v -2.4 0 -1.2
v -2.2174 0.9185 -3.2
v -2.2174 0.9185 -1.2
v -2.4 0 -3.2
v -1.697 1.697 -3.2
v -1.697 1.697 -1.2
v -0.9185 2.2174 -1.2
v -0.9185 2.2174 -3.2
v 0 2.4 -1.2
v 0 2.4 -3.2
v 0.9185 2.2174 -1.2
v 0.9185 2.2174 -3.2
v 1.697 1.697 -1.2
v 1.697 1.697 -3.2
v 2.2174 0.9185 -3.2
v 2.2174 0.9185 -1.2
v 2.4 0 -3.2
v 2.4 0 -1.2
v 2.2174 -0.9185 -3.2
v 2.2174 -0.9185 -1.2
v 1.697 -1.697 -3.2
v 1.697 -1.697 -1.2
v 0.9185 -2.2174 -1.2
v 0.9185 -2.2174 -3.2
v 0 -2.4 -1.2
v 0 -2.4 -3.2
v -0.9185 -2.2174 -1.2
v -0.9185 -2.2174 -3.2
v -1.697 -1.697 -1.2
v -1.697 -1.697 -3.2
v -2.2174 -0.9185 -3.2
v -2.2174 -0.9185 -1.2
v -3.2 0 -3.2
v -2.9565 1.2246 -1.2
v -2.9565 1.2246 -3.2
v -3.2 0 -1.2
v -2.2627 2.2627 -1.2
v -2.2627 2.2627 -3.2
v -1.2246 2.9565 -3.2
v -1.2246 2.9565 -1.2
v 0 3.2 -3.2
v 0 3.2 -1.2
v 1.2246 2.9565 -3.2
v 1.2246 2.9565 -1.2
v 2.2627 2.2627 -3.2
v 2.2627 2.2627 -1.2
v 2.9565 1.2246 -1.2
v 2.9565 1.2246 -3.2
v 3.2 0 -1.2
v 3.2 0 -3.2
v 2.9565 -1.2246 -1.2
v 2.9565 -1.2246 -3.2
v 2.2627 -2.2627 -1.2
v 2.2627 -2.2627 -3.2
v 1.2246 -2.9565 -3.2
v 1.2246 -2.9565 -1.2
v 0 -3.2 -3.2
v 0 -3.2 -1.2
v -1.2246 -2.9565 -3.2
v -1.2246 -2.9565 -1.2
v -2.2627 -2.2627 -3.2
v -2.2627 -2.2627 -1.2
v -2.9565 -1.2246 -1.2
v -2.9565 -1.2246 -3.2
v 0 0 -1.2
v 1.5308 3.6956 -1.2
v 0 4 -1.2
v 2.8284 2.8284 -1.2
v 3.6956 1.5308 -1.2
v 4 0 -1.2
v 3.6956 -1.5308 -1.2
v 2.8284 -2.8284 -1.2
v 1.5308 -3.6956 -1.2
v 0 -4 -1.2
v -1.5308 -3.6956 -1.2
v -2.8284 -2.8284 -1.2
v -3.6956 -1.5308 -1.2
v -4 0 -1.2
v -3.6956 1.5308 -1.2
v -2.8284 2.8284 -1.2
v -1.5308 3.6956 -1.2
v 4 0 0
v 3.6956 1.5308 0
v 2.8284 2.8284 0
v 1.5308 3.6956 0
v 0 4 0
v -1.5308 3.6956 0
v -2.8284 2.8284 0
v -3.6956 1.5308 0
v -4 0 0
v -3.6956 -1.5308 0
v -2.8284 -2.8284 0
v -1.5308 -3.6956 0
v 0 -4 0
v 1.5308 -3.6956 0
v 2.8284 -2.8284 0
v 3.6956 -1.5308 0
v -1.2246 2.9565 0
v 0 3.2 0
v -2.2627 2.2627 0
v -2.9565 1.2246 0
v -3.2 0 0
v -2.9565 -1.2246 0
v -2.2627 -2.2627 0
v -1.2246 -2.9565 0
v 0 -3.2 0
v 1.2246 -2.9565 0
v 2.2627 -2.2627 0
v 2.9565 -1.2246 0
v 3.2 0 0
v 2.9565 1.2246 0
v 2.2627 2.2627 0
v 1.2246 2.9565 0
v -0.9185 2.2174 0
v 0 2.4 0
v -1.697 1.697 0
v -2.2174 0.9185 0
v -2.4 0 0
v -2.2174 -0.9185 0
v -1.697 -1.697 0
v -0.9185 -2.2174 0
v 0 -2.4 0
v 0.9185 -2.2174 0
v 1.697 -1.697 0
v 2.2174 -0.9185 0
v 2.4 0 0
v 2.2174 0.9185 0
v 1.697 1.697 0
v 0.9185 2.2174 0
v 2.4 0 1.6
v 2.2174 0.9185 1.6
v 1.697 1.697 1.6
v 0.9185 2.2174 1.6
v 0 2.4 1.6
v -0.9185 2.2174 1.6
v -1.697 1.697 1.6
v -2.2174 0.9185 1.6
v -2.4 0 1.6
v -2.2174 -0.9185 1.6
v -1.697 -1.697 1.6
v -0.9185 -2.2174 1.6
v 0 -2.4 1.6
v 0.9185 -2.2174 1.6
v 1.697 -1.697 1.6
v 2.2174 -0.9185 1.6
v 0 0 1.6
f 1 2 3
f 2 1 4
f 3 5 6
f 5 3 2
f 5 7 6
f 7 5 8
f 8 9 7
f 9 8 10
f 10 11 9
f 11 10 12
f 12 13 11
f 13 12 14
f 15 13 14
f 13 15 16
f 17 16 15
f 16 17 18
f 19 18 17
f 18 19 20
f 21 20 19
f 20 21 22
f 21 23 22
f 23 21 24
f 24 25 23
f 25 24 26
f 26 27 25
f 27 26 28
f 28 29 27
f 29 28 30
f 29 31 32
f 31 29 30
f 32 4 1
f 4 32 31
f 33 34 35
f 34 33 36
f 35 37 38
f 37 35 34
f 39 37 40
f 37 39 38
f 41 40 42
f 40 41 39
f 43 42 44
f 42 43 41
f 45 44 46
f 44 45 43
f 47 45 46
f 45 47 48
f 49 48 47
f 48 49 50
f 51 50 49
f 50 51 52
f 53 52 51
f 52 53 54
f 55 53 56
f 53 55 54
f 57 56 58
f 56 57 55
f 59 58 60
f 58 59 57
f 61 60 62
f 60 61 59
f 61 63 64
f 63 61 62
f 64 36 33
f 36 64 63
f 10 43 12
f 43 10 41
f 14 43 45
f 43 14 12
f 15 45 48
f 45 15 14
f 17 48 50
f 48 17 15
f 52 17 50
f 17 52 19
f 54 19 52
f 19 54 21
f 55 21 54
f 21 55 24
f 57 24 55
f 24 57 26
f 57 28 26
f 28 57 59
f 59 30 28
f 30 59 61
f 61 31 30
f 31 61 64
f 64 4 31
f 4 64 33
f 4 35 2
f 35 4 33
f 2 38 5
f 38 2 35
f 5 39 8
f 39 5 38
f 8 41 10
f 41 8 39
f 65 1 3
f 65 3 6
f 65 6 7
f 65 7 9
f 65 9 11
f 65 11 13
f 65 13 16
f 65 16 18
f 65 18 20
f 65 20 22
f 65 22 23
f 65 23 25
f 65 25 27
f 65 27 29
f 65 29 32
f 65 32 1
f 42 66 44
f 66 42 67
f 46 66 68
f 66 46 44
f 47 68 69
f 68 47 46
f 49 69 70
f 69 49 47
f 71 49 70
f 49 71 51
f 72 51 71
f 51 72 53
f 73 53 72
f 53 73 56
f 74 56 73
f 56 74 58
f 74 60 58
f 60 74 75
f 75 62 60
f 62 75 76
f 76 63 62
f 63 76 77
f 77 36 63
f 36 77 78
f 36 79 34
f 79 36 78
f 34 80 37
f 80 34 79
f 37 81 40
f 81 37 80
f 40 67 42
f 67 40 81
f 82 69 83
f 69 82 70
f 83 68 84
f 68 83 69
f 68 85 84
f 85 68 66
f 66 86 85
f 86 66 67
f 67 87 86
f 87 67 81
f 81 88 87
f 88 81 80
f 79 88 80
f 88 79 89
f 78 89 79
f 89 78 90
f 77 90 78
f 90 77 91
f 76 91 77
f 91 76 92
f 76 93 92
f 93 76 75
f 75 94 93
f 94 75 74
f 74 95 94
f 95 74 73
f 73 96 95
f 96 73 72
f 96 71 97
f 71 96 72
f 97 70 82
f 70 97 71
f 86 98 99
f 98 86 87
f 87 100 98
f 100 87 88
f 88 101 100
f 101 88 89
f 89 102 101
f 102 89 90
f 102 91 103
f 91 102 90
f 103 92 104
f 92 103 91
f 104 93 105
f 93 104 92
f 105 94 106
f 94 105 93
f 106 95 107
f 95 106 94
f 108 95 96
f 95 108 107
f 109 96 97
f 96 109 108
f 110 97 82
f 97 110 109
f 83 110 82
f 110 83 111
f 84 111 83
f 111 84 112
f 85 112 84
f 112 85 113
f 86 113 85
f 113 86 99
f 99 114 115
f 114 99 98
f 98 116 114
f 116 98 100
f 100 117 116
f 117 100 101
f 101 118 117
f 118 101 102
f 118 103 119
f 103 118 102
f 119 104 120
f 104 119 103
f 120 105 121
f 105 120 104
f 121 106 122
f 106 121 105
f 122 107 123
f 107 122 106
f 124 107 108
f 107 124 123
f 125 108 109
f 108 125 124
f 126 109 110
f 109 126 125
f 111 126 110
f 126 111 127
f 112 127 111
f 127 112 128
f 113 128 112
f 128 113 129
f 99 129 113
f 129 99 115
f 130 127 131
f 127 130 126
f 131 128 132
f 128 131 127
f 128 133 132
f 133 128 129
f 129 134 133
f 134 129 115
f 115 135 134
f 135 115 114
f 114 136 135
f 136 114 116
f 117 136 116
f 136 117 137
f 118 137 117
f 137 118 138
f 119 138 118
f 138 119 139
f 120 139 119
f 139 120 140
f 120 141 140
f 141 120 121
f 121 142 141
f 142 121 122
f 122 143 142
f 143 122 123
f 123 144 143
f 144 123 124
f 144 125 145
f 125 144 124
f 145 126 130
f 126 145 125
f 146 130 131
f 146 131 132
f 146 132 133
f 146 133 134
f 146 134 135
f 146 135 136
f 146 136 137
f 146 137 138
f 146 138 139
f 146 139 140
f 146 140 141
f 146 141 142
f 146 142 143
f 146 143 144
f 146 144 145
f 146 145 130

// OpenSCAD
// file: ../p/4-4edge.scad
use <../lib.scad>
function ldraw_lib__4_4edge() = [
// 0 Circle 1.0
// 0 Name: 4-4edge.dat
// 0 Author: James Jessiman
// 0 !LDRAW_ORG Primitive UPDATE 2017-01
// 0 !LICENSE Licensed under CC BY 2.0 and CC BY 4.0 : see CAreadme.txt
// 
// 0 BFC CERTIFY CCW
  [0,"BFC","CERTIFY"],
  [0,"BFC","CCW"],
// 
// 0 !HISTORY 1998-12-15 [PTadmin] Official Update 1998-10
// 0 !HISTORY 2005-12-28 [PTadmin] Official Update 2005-01
// 0 !HISTORY 2007-06-24 [PTadmin] Header formatted for Contributor Agreement
// 0 !HISTORY 2008-07-01 [PTadmin] Official Update 2008-01
// 0 !HISTORY 2017-01-15 [Steffen] BFCed
// 0 !HISTORY 2017-12-30 [PTadmin] Official Update 2017-01
// 
// 
// 2 24 1 0 0 0.9239 0 0.3827
  [2,24,1,0,0,0.9239,0,0.3827],
// 2 24 0.9239 0 0.3827 0.7071 0 0.7071
  [2,24,0.9239,0,0.3827,0.7071,0,0.7071],
// 2 24 0.7071 0 0.7071 0.3827 0 0.9239
  [2,24,0.7071,0,0.7071,0.3827,0,0.9239],
// 2 24 0.3827 0 0.9239 0 0 1
  [2,24,0.3827,0,0.9239,0,0,1],
// 2 24 0 0 1 -0.3827 0 0.9239
  [2,24,0,0,1,-0.3827,0,0.9239],
// 2 24 -0.3827 0 0.9239 -0.7071 0 0.7071
  [2,24,-0.3827,0,0.9239,-0.7071,0,0.7071],
// 2 24 -0.7071 0 0.7071 -0.9239 0 0.3827
  [2,24,-0.7071,0,0.7071,-0.9239,0,0.3827],
// 2 24 -0.9239 0 0.3827 -1 0 -0
  [2,24,-0.9239,0,0.3827,-1,0,-0],
// 2 24 -1 0 -0 -0.9239 0 -0.3827
  [2,24,-1,0,-0,-0.9239,0,-0.3827],
// 2 24 -0.9239 0 -0.3827 -0.7071 0 -0.7071
  [2,24,-0.9239,0,-0.3827,-0.7071,0,-0.7071],
// 2 24 -0.7071 0 -0.7071 -0.3827 0 -0.9239
  [2,24,-0.7071,0,-0.7071,-0.3827,0,-0.9239],
// 2 24 -0.3827 0 -0.9239 0 0 -1
  [2,24,-0.3827,0,-0.9239,0,0,-1],
// 2 24 0 0 -1 0.3827 0 -0.9239
  [2,24,0,0,-1,0.3827,0,-0.9239],
// 2 24 0.3827 0 -0.9239 0.7071 0 -0.7071
  [2,24,0.3827,0,-0.9239,0.7071,0,-0.7071],
// 2 24 0.7071 0 -0.7071 0.9239 0 -0.3827
  [2,24,0.7071,0,-0.7071,0.9239,0,-0.3827],
// 2 24 0.9239 0 -0.3827 1 0 0
  [2,24,0.9239,0,-0.3827,1,0,0],
];
module ldraw_lib__4_4edge(step=0, col=false, unit=2/5, alt=false, line=0.2, solid=!$preview)
    makepoly(ldraw_lib__4_4edge(), step=step, col=col, unit=unit, alt=alt, line=line, solid=solid);
ldraw_lib__4_4edge(line=0.2);
// file: ../p/4-4cyli.scad
use <../lib.scad>
function ldraw_lib__4_4cyli() = [
// 0 Cylinder 1.0
// 0 Name: 4-4cyli.dat
// 0 Author: James Jessiman
// 0 !LDRAW_ORG Primitive UPDATE 2005-01
// 0 !LICENSE Licensed under CC BY 2.0 and CC BY 4.0 : see CAreadme.txt
// 
// 0 BFC CERTIFY CCW
  [0,"BFC","CERTIFY"],
  [0,"BFC","CCW"],
// 
// 0 !HISTORY 1998-12-15 [PTadmin] Official Update 1998-10
// 0 !HISTORY 2002-03-23 [sbliss] Added BFC statement; merged headers from files in distributions LDraw 0.27 and Complete.
// 0 !HISTORY 2002-04-25 [PTadmin] Official Update 2002-02
// 0 !HISTORY 2004-12-14 [guyvivan] BFC CCW
// 0 !HISTORY 2005-12-28 [PTadmin] Official Update 2005-01
// 0 !HISTORY 2007-06-24 [PTadmin] Header formatted for Contributor Agreement
// 0 !HISTORY 2008-07-01 [PTadmin] Official Update 2008-01
// 
// 
// 4 16 1 1 0 0.9239 1 0.3827 0.9239 0 0.3827 1 0 0
  [4,16,1,1,0,0.9239,1,0.3827,0.9239,0,0.3827,1,0,0],
// 5 24 1 0 0 1 1 0 0.9239 0 0.3827 0.9239 0 -0.3827
  [5,24,1,0,0,1,1,0,0.9239,0,0.3827,0.9239,0,-0.3827],
// 4 16 0.9239 1 0.3827 0.7071 1 0.7071 0.7071 0 0.7071 0.9239 0 0.3827
  [4,16,0.9239,1,0.3827,0.7071,1,0.7071,0.7071,0,0.7071,0.9239,0,0.3827],
// 5 24 0.9239 0 0.3827 0.9239 1 0.3827 0.7071 0 0.7071 1 0 0
  [5,24,0.9239,0,0.3827,0.9239,1,0.3827,0.7071,0,0.7071,1,0,0],
// 4 16 0.7071 1 0.7071 0.3827 1 0.9239 0.3827 0 0.9239 0.7071 0 0.7071
  [4,16,0.7071,1,0.7071,0.3827,1,0.9239,0.3827,0,0.9239,0.7071,0,0.7071],
// 5 24 0.7071 0 0.7071 0.7071 1 0.7071 0.3827 0 0.9239 0.9239 0 0.3827
  [5,24,0.7071,0,0.7071,0.7071,1,0.7071,0.3827,0,0.9239,0.9239,0,0.3827],
// 4 16 0.3827 1 0.9239 0 1 1 0 0 1 0.3827 0 0.9239
  [4,16,0.3827,1,0.9239,0,1,1,0,0,1,0.3827,0,0.9239],
// 5 24 0.3827 0 0.9239 0.3827 1 0.9239 0 0 1 0.7071 0 0.7071
  [5,24,0.3827,0,0.9239,0.3827,1,0.9239,0,0,1,0.7071,0,0.7071],
// 4 16 0 1 1 -0.3827 1 0.9239 -0.3827 0 0.9239 0 0 1
  [4,16,0,1,1,-0.3827,1,0.9239,-0.3827,0,0.9239,0,0,1],
// 5 24 0 0 1 0 1 1 -0.3827 0 0.9239 0.3827 0 0.9239
  [5,24,0,0,1,0,1,1,-0.3827,0,0.9239,0.3827,0,0.9239],
// 4 16 -0.3827 1 0.9239 -0.7071 1 0.7071 -0.7071 0 0.7071 -0.3827 0 0.9239
  [4,16,-0.3827,1,0.9239,-0.7071,1,0.7071,-0.7071,0,0.7071,-0.3827,0,0.9239],
// 5 24 -0.3827 0 0.9239 -0.3827 1 0.9239 -0.7071 0 0.7071 0 0 1
  [5,24,-0.3827,0,0.9239,-0.3827,1,0.9239,-0.7071,0,0.7071,0,0,1],
// 4 16 -0.7071 1 0.7071 -0.9239 1 0.3827 -0.9239 0 0.3827 -0.7071 0 0.7071
  [4,16,-0.7071,1,0.7071,-0.9239,1,0.3827,-0.9239,0,0.3827,-0.7071,0,0.7071],
// 5 24 -0.7071 0 0.7071 -0.7071 1 0.7071 -0.9239 0 0.3827 -0.3827 0 0.9239
  [5,24,-0.7071,0,0.7071,-0.7071,1,0.7071,-0.9239,0,0.3827,-0.3827,0,0.9239],
// 4 16 -0.9239 1 0.3827 -1 1 0 -1 0 0 -0.9239 0 0.3827
  [4,16,-0.9239,1,0.3827,-1,1,0,-1,0,0,-0.9239,0,0.3827],
// 5 24 -0.9239 0 0.3827 -0.9239 1 0.3827 -1 0 0 -0.7071 0 0.7071
  [5,24,-0.9239,0,0.3827,-0.9239,1,0.3827,-1,0,0,-0.7071,0,0.7071],
// 4 16 -1 1 0 -0.9239 1 -0.3827 -0.9239 0 -0.3827 -1 0 0
  [4,16,-1,1,0,-0.9239,1,-0.3827,-0.9239,0,-0.3827,-1,0,0],
// 5 24 -1 0 0 -1 1 0 -0.9239 0 -0.3827 -0.9239 0 0.3827
  [5,24,-1,0,0,-1,1,0,-0.9239,0,-0.3827,-0.9239,0,0.3827],
// 4 16 -0.9239 1 -0.3827 -0.7071 1 -0.7071 -0.7071 0 -0.7071 -0.9239 0 -0.3827
  [4,16,-0.9239,1,-0.3827,-0.7071,1,-0.7071,-0.7071,0,-0.7071,-0.9239,0,-0.3827],
// 5 24 -0.9239 0 -0.3827 -0.9239 1 -0.3827 -0.7071 0 -0.7071 -1 0 0
  [5,24,-0.9239,0,-0.3827,-0.9239,1,-0.3827,-0.7071,0,-0.7071,-1,0,0],
// 4 16 -0.7071 1 -0.7071 -0.3827 1 -0.9239 -0.3827 0 -0.9239 -0.7071 0 -0.7071
  [4,16,-0.7071,1,-0.7071,-0.3827,1,-0.9239,-0.3827,0,-0.9239,-0.7071,0,-0.7071],
// 5 24 -0.7071 0 -0.7071 -0.7071 1 -0.7071 -0.3827 0 -0.9239 -0.9239 0 -0.3827
  [5,24,-0.7071,0,-0.7071,-0.7071,1,-0.7071,-0.3827,0,-0.9239,-0.9239,0,-0.3827],
// 4 16 -0.3827 1 -0.9239 0 1 -1 0 0 -1 -0.3827 0 -0.9239
  [4,16,-0.3827,1,-0.9239,0,1,-1,0,0,-1,-0.3827,0,-0.9239],
// 5 24 -0.3827 0 -0.9239 -0.3827 1 -0.9239 0 0 -1 -0.7071 0 -0.7071
  [5,24,-0.3827,0,-0.9239,-0.3827,1,-0.9239,0,0,-1,-0.7071,0,-0.7071],
// 4 16 0 1 -1 0.3827 1 -0.9239 0.3827 0 -0.9239 0 0 -1
  [4,16,0,1,-1,0.3827,1,-0.9239,0.3827,0,-0.9239,0,0,-1],
// 5 24 0 0 -1 0 1 -1 0.3827 0 -0.9239 -0.3827 0 -0.9239
  [5,24,0,0,-1,0,1,-1,0.3827,0,-0.9239,-0.3827,0,-0.9239],
// 4 16 0.3827 1 -0.9239 0.7071 1 -0.7071 0.7071 0 -0.7071 0.3827 0 -0.9239
  [4,16,0.3827,1,-0.9239,0.7071,1,-0.7071,0.7071,0,-0.7071,0.3827,0,-0.9239],
// 5 24 0.3827 0 -0.9239 0.3827 1 -0.9239 0.7071 0 -0.7071 0 0 -1
  [5,24,0.3827,0,-0.9239,0.3827,1,-0.9239,0.7071,0,-0.7071,0,0,-1],
// 4 16 0.7071 1 -0.7071 0.9239 1 -0.3827 0.9239 0 -0.3827 0.7071 0 -0.7071
  [4,16,0.7071,1,-0.7071,0.9239,1,-0.3827,0.9239,0,-0.3827,0.7071,0,-0.7071],
// 5 24 0.7071 0 -0.7071 0.7071 1 -0.7071 0.9239 0 -0.3827 0.3827 0 -0.9239
  [5,24,0.7071,0,-0.7071,0.7071,1,-0.7071,0.9239,0,-0.3827,0.3827,0,-0.9239],
// 4 16 0.9239 1 -0.3827 1 1 0 1 0 0 0.9239 0 -0.3827
  [4,16,0.9239,1,-0.3827,1,1,0,1,0,0,0.9239,0,-0.3827],
// 5 24 0.9239 0 -0.3827 0.9239 1 -0.3827 1 0 0 0.7071 0 -0.7071
  [5,24,0.9239,0,-0.3827,0.9239,1,-0.3827,1,0,0,0.7071,0,-0.7071],
// 0
];
module ldraw_lib__4_4cyli(step=0, col=false, unit=2/5, alt=false, line=0.2, solid=!$preview)
    makepoly(ldraw_lib__4_4cyli(), step=step, col=col, unit=unit, alt=alt, line=line, solid=solid);
ldraw_lib__4_4cyli(line=0.2);
// file: ../p/stud4.scad
use <../lib.scad>
use <4-4cyli.scad>
use <4-4edge.scad>
use <4-4ring3.scad>
function ldraw_lib__stud4() = [
// 0 Stud Tube Open
// 0 Name: stud4.dat
// 0 Author: James Jessiman
// 0 !LDRAW_ORG Primitive UPDATE 2009-02
// 0 !LICENSE Licensed under CC BY 2.0 and CC BY 4.0 : see CAreadme.txt
// 
// 0 BFC CERTIFY CCW
  [0,"BFC","CERTIFY"],
  [0,"BFC","CCW"],
// 
// 0 !HISTORY 1999-07-05 [PTadmin] Official Update 1999-05
// 0 !HISTORY 2002-04-04 [sbliss] Modified for BFC compliance
// 0 !HISTORY 2002-04-25 [PTadmin] Official Update 2002-02
// 0 !HISTORY 2007-06-24 [PTadmin] Header formatted for Contributor Agreement
// 0 !HISTORY 2008-07-01 [PTadmin] Official Update 2008-01
// 0 !HISTORY 2009-06-21 [cwdee] Update ring references to 4-4ring
// 0 !HISTORY 2009-09-03 [PTadmin] Official Update 2009-02
// 
// 
// 1 16 0 -4 0 6 0 0 0 1 0 0 0 6 4-4edge.dat
  [1,16,0,-4,0,6,0,0,0,1,0,0,0,6, ldraw_lib__4_4edge()],
// 1 16 0 -4 0 8 0 0 0 1 0 0 0 8 4-4edge.dat
  [1,16,0,-4,0,8,0,0,0,1,0,0,0,8, ldraw_lib__4_4edge()],
// 1 16 0 0 0 6 0 0 0 1 0 0 0 6 4-4edge.dat
  [1,16,0,0,0,6,0,0,0,1,0,0,0,6, ldraw_lib__4_4edge()],
// 1 16 0 0 0 8 0 0 0 1 0 0 0 8 4-4edge.dat
  [1,16,0,0,0,8,0,0,0,1,0,0,0,8, ldraw_lib__4_4edge()],
// 0 BFC INVERTNEXT
  [0,"BFC","INVERTNEXT"],
// 1 16 0 -4 0 6 0 0 0 4 0 0 0 6 4-4cyli.dat
  [1,16,0,-4,0,6,0,0,0,4,0,0,0,6, ldraw_lib__4_4cyli()],
// 1 16 0 -4 0 8 0 0 0 4 0 0 0 8 4-4cyli.dat
  [1,16,0,-4,0,8,0,0,0,4,0,0,0,8, ldraw_lib__4_4cyli()],
// 1 16 0 -4 0 2 0 0 0 1 0 0 0 2 4-4ring3.dat
  [1,16,0,-4,0,2,0,0,0,1,0,0,0,2, ldraw_lib__4_4ring3()],
// 0
];
module ldraw_lib__stud4(step=0, col=false, unit=2/5, alt=false, line=0.2, solid=!$preview)
    makepoly(ldraw_lib__stud4(), step=step, col=col, unit=unit, alt=alt, line=line, solid=solid);
ldraw_lib__stud4(line=0.2);
// file: ../p/stud.scad
use <../lib.scad>
use <4-4cyli.scad>
use <4-4disc.scad>
use <4-4edge.scad>
function ldraw_lib__stud() = [
// 0 Stud
// 0 Name: stud.dat
// 0 Author: James Jessiman
// 0 !LDRAW_ORG Primitive UPDATE 2012-01
// 0 !LICENSE Licensed under CC BY 2.0 and CC BY 4.0 : see CAreadme.txt
// 
// 0 BFC CERTIFY CCW
  [0,"BFC","CERTIFY"],
  [0,"BFC","CCW"],
// 
// 0 !HISTORY 2002-04-04 [sbliss] Modified for BFC compliance
// 0 !HISTORY 2002-04-25 [PTadmin] Official Update 2002-02
// 0 !HISTORY 2007-06-24 [PTadmin] Header formatted for Contributor Agreement
// 0 !HISTORY 2008-07-01 [PTadmin] Official Update 2008-01
// 0 !HISTORY 2012-02-16 [Philo] Changed to CCW
// 0 !HISTORY 2012-03-30 [PTadmin] Official Update 2012-01
// 
// 
// 1 16 0 0 0 6 0 0 0 1 0 0 0 6 4-4edge.dat
  [1,16,0,0,0,6,0,0,0,1,0,0,0,6, ldraw_lib__4_4edge()],
// 1 16 0 -4 0 6 0 0 0 1 0 0 0 6 4-4edge.dat
  [1,16,0,-4,0,6,0,0,0,1,0,0,0,6, ldraw_lib__4_4edge()],
// 1 16 0 0 0 6 0 0 0 -4 0 0 0 6 4-4cyli.dat
  [1,16,0,0,0,6,0,0,0,-4,0,0,0,6, ldraw_lib__4_4cyli()],
// 1 16 0 -4 0 6 0 0 0 1 0 0 0 6 4-4disc.dat
  [1,16,0,-4,0,6,0,0,0,1,0,0,0,6, ldraw_lib__4_4disc()],
];
module ldraw_lib__stud(step=0, col=false, unit=2/5, alt=false, line=0.2, solid=!$preview)
    makepoly(ldraw_lib__stud(), step=step, col=col, unit=unit, alt=alt, line=line, solid=solid);
ldraw_lib__stud(line=0.2);
// file: ../p/4-4ring4.scad
use <../lib.scad>
function ldraw_lib__4_4ring4() = [
// 0 Ring  4 x 1.0
// 0 Name: 4-4ring4.dat
// 0 Author: James Jessiman
// 0 !LDRAW_ORG Primitive UPDATE 2009-01
// 0 !LICENSE Licensed under CC BY 2.0 and CC BY 4.0 : see CAreadme.txt
// 
// 0 BFC CERTIFY CCW
  [0,"BFC","CERTIFY"],
  [0,"BFC","CCW"],
// 
// 0 !HISTORY 1998-12-15 [PTadmin] Official Update 1998-10
// 0 !HISTORY 2002-04-08 [BrickCaster] Modified for BFC compliance
// 0 !HISTORY 2002-04-25 [PTadmin] Official Update 2002-02
// 0 !HISTORY 2007-06-24 [PTadmin] Header formatted for Contributor Agreement
// 0 !HISTORY 2008-07-01 [PTadmin] Official Update 2008-01
// 0 !HISTORY 2008-08-26 [cwdee] Switch polygon winding and rename
// 0 !HISTORY 2009-05-02 [PTadmin] Official Update 2009-01
// 
// 
// 4 16 -1.9135 0 4.6195 -1.5308 0 3.6956 0 0 4 0 0 5
  [4,16,-1.9135,0,4.6195,-1.5308,0,3.6956,0,0,4,0,0,5],
// 4 16 -3.5355 0 3.5355 -2.8284 0 2.8284 -1.5308 0 3.6956 -1.9135 0 4.6195
  [4,16,-3.5355,0,3.5355,-2.8284,0,2.8284,-1.5308,0,3.6956,-1.9135,0,4.6195],
// 4 16 -4.6195 0 1.9135 -3.6956 0 1.5308 -2.8284 0 2.8284 -3.5355 0 3.5355
  [4,16,-4.6195,0,1.9135,-3.6956,0,1.5308,-2.8284,0,2.8284,-3.5355,0,3.5355],
// 4 16 -5 0 0 -4 0 0 -3.6956 0 1.5308 -4.6195 0 1.9135
  [4,16,-5,0,0,-4,0,0,-3.6956,0,1.5308,-4.6195,0,1.9135],
// 4 16 -4.6195 0 -1.9135 -3.6956 0 -1.5308 -4 0 0 -5 0 0
  [4,16,-4.6195,0,-1.9135,-3.6956,0,-1.5308,-4,0,0,-5,0,0],
// 4 16 -3.5355 0 -3.5355 -2.8284 0 -2.8284 -3.6956 0 -1.5308 -4.6195 0 -1.9135
  [4,16,-3.5355,0,-3.5355,-2.8284,0,-2.8284,-3.6956,0,-1.5308,-4.6195,0,-1.9135],
// 4 16 -1.9135 0 -4.6195 -1.5308 0 -3.6956 -2.8284 0 -2.8284 -3.5355 0 -3.5355
  [4,16,-1.9135,0,-4.6195,-1.5308,0,-3.6956,-2.8284,0,-2.8284,-3.5355,0,-3.5355],
// 4 16 0 0 -5 0 0 -4 -1.5308 0 -3.6956 -1.9135 0 -4.6195
  [4,16,0,0,-5,0,0,-4,-1.5308,0,-3.6956,-1.9135,0,-4.6195],
// 4 16 1.9135 0 -4.6195 1.5308 0 -3.6956 0 0 -4 0 0 -5
  [4,16,1.9135,0,-4.6195,1.5308,0,-3.6956,0,0,-4,0,0,-5],
// 4 16 3.5355 0 -3.5355 2.8284 0 -2.8284 1.5308 0 -3.6956 1.9135 0 -4.6195
  [4,16,3.5355,0,-3.5355,2.8284,0,-2.8284,1.5308,0,-3.6956,1.9135,0,-4.6195],
// 4 16 4.6195 0 -1.9135 3.6956 0 -1.5308 2.8284 0 -2.8284 3.5355 0 -3.5355
  [4,16,4.6195,0,-1.9135,3.6956,0,-1.5308,2.8284,0,-2.8284,3.5355,0,-3.5355],
// 4 16 5 0 0 4 0 0 3.6956 0 -1.5308 4.6195 0 -1.9135
  [4,16,5,0,0,4,0,0,3.6956,0,-1.5308,4.6195,0,-1.9135],
// 4 16 4.6195 0 1.9135 3.6956 0 1.5308 4 0 0 5 0 0
  [4,16,4.6195,0,1.9135,3.6956,0,1.5308,4,0,0,5,0,0],
// 4 16 3.5355 0 3.5355 2.8284 0 2.8284 3.6956 0 1.5308 4.6195 0 1.9135
  [4,16,3.5355,0,3.5355,2.8284,0,2.8284,3.6956,0,1.5308,4.6195,0,1.9135],
// 4 16 1.9135 0 4.6195 1.5308 0 3.6956 2.8284 0 2.8284 3.5355 0 3.5355
  [4,16,1.9135,0,4.6195,1.5308,0,3.6956,2.8284,0,2.8284,3.5355,0,3.5355],
// 4 16 0 0 5 0 0 4 1.5308 0 3.6956 1.9135 0 4.6195
  [4,16,0,0,5,0,0,4,1.5308,0,3.6956,1.9135,0,4.6195],
// 0
];
module ldraw_lib__4_4ring4(step=0, col=false, unit=2/5, alt=false, line=0.2, solid=!$preview)
    makepoly(ldraw_lib__4_4ring4(), step=step, col=col, unit=unit, alt=alt, line=line, solid=solid);
ldraw_lib__4_4ring4(line=0.2);
// file: ../p/4-4ring3.scad
use <../lib.scad>
function ldraw_lib__4_4ring3() = [
// 0 Ring  3 x 1.0
// 0 Name: 4-4ring3.dat
// 0 Author: James Jessiman
// 0 !LDRAW_ORG Primitive UPDATE 2009-01
// 0 !LICENSE Licensed under CC BY 2.0 and CC BY 4.0 : see CAreadme.txt
// 
// 0 BFC CERTIFY CCW
  [0,"BFC","CERTIFY"],
  [0,"BFC","CCW"],
// 
// 0 !HISTORY 1998-12-15 [PTadmin] Official Update 1998-10
// 0 !HISTORY 2002-04-05 [hafhead] Added BFC statement
// 0 !HISTORY 2002-04-25 [PTadmin] Official Update 2002-02
// 0 !HISTORY 2007-06-24 [PTadmin] Header formatted for Contributor Agreement
// 0 !HISTORY 2008-07-01 [PTadmin] Official Update 2008-01
// 0 !HISTORY 2008-08-26 [cwdee] Switch polygon winding and rename
// 0 !HISTORY 2009-05-02 [PTadmin] Official Update 2009-01
// 
// 
// 4 16 -1.5308 0 3.6956 -1.1481 0 2.7717 0 0 3 0 0 4
  [4,16,-1.5308,0,3.6956,-1.1481,0,2.7717,0,0,3,0,0,4],
// 4 16 -2.8284 0 2.8284 -2.1213 0 2.1213 -1.1481 0 2.7717 -1.5308 0 3.6956
  [4,16,-2.8284,0,2.8284,-2.1213,0,2.1213,-1.1481,0,2.7717,-1.5308,0,3.6956],
// 4 16 -3.6956 0 1.5308 -2.7717 0 1.1481 -2.1213 0 2.1213 -2.8284 0 2.8284
  [4,16,-3.6956,0,1.5308,-2.7717,0,1.1481,-2.1213,0,2.1213,-2.8284,0,2.8284],
// 4 16 -4 0 0 -3 0 0 -2.7717 0 1.1481 -3.6956 0 1.5308
  [4,16,-4,0,0,-3,0,0,-2.7717,0,1.1481,-3.6956,0,1.5308],
// 4 16 -3.6956 0 -1.5308 -2.7717 0 -1.1481 -3 0 0 -4 0 0
  [4,16,-3.6956,0,-1.5308,-2.7717,0,-1.1481,-3,0,0,-4,0,0],
// 4 16 -2.8284 0 -2.8284 -2.1213 0 -2.1213 -2.7717 0 -1.1481 -3.6956 0 -1.5308
  [4,16,-2.8284,0,-2.8284,-2.1213,0,-2.1213,-2.7717,0,-1.1481,-3.6956,0,-1.5308],
// 4 16 -1.5308 0 -3.6956 -1.1481 0 -2.7717 -2.1213 0 -2.1213 -2.8284 0 -2.8284
  [4,16,-1.5308,0,-3.6956,-1.1481,0,-2.7717,-2.1213,0,-2.1213,-2.8284,0,-2.8284],
// 4 16 0 0 -4 0 0 -3 -1.1481 0 -2.7717 -1.5308 0 -3.6956
  [4,16,0,0,-4,0,0,-3,-1.1481,0,-2.7717,-1.5308,0,-3.6956],
// 4 16 1.5308 0 -3.6956 1.1481 0 -2.7717 0 0 -3 0 0 -4
  [4,16,1.5308,0,-3.6956,1.1481,0,-2.7717,0,0,-3,0,0,-4],
// 4 16 2.8284 0 -2.8284 2.1213 0 -2.1213 1.1481 0 -2.7717 1.5308 0 -3.6956
  [4,16,2.8284,0,-2.8284,2.1213,0,-2.1213,1.1481,0,-2.7717,1.5308,0,-3.6956],
// 4 16 3.6956 0 -1.5308 2.7717 0 -1.1481 2.1213 0 -2.1213 2.8284 0 -2.8284
  [4,16,3.6956,0,-1.5308,2.7717,0,-1.1481,2.1213,0,-2.1213,2.8284,0,-2.8284],
// 4 16 4 0 0 3 0 0 2.7717 0 -1.1481 3.6956 0 -1.5308
  [4,16,4,0,0,3,0,0,2.7717,0,-1.1481,3.6956,0,-1.5308],
// 4 16 3.6956 0 1.5308 2.7717 0 1.1481 3 0 0 4 0 0
  [4,16,3.6956,0,1.5308,2.7717,0,1.1481,3,0,0,4,0,0],
// 4 16 2.8284 0 2.8284 2.1213 0 2.1213 2.7717 0 1.1481 3.6956 0 1.5308
  [4,16,2.8284,0,2.8284,2.1213,0,2.1213,2.7717,0,1.1481,3.6956,0,1.5308],
// 4 16 1.5308 0 3.6956 1.1481 0 2.7717 2.1213 0 2.1213 2.8284 0 2.8284
  [4,16,1.5308,0,3.6956,1.1481,0,2.7717,2.1213,0,2.1213,2.8284,0,2.8284],
// 4 16 0 0 4 0 0 3 1.1481 0 2.7717 1.5308 0 3.6956
  [4,16,0,0,4,0,0,3,1.1481,0,2.7717,1.5308,0,3.6956],
// 0
];
module ldraw_lib__4_4ring3(step=0, col=false, unit=2/5, alt=false, line=0.2, solid=!$preview)
    makepoly(ldraw_lib__4_4ring3(), step=step, col=col, unit=unit, alt=alt, line=line, solid=solid);
ldraw_lib__4_4ring3(line=0.2);
// file: ../p/4-4disc.scad
use <../lib.scad>
function ldraw_lib__4_4disc() = [
// 0 Disc 1.0
// 0 Name: 4-4disc.dat
// 0 Author: James Jessiman
// 0 !LDRAW_ORG Primitive UPDATE 2002-02
// 0 !LICENSE Licensed under CC BY 2.0 and CC BY 4.0 : see CAreadme.txt
// 
// 0 BFC CERTIFY CCW
  [0,"BFC","CERTIFY"],
  [0,"BFC","CCW"],
// 
// 0 !HISTORY 1998-12-15 [PTadmin] Official Update 1998-10
// 0 !HISTORY 2002-03-23 [sbliss] Added BFC statement
// 0 !HISTORY 2002-04-25 [PTadmin] Official Update 2002-02
// 0 !HISTORY 2007-06-24 [PTadmin] Header formatted for Contributor Agreement
// 0 !HISTORY 2008-07-01 [PTadmin] Official Update 2008-01
// 
// 
// 3 16 0 0 0 1 0 0 0.9239 0 0.3827
  [3,16,0,0,0,1,0,0,0.9239,0,0.3827],
// 3 16 0 0 0 0.9239 0 0.3827 0.7071 0 0.7071
  [3,16,0,0,0,0.9239,0,0.3827,0.7071,0,0.7071],
// 3 16 0 0 0 0.7071 0 0.7071 0.3827 0 0.9239
  [3,16,0,0,0,0.7071,0,0.7071,0.3827,0,0.9239],
// 3 16 0 0 0 0.3827 0 0.9239 0 0 1
  [3,16,0,0,0,0.3827,0,0.9239,0,0,1],
// 3 16 0 0 0 0 0 1 -0.3827 0 0.9239
  [3,16,0,0,0,0,0,1,-0.3827,0,0.9239],
// 3 16 0 0 0 -0.3827 0 0.9239 -0.7071 0 0.7071
  [3,16,0,0,0,-0.3827,0,0.9239,-0.7071,0,0.7071],
// 3 16 0 0 0 -0.7071 0 0.7071 -0.9239 0 0.3827
  [3,16,0,0,0,-0.7071,0,0.7071,-0.9239,0,0.3827],
// 3 16 0 0 0 -0.9239 0 0.3827 -1 0 -0
  [3,16,0,0,0,-0.9239,0,0.3827,-1,0,-0],
// 3 16 0 0 0 -1 0 -0 -0.9239 0 -0.3827
  [3,16,0,0,0,-1,0,-0,-0.9239,0,-0.3827],
// 3 16 0 0 0 -0.9239 0 -0.3827 -0.7071 0 -0.7071
  [3,16,0,0,0,-0.9239,0,-0.3827,-0.7071,0,-0.7071],
// 3 16 0 0 0 -0.7071 0 -0.7071 -0.3827 0 -0.9239
  [3,16,0,0,0,-0.7071,0,-0.7071,-0.3827,0,-0.9239],
// 3 16 0 0 0 -0.3827 0 -0.9239 0 0 -1
  [3,16,0,0,0,-0.3827,0,-0.9239,0,0,-1],
// 3 16 0 0 0 0 0 -1 0.3827 0 -0.9239
  [3,16,0,0,0,0,0,-1,0.3827,0,-0.9239],
// 3 16 0 0 0 0.3827 0 -0.9239 0.7071 0 -0.7071
  [3,16,0,0,0,0.3827,0,-0.9239,0.7071,0,-0.7071],
// 3 16 0 0 0 0.7071 0 -0.7071 0.9239 0 -0.3827
  [3,16,0,0,0,0.7071,0,-0.7071,0.9239,0,-0.3827],
// 3 16 0 0 0 0.9239 0 -0.3827 1 0 0
  [3,16,0,0,0,0.9239,0,-0.3827,1,0,0],
// 0
];
module ldraw_lib__4_4disc(step=0, col=false, unit=2/5, alt=false, line=0.2, solid=!$preview)
    makepoly(ldraw_lib__4_4disc(), step=step, col=col, unit=unit, alt=alt, line=line, solid=solid);
ldraw_lib__4_4disc(line=0.2);
// file: ../p/4-4cylo.scad
use <../lib.scad>
use <4-4cyli.scad>
use <4-4edge.scad>
function ldraw_lib__4_4cylo() = [
// 0 Cylinder Open 1.0
// 0 Name: 4-4cylo.dat
// 0 Author: Mark Kennedy [mkennedy]
// 0 !LDRAW_ORG Primitive UPDATE 2010-01
// 0 !LICENSE Licensed under CC BY 2.0 and CC BY 4.0 : see CAreadme.txt
// 
// 0 BFC CERTIFY CCW
  [0,"BFC","CERTIFY"],
  [0,"BFC","CCW"],
// 
// 0 !HISTORY 2010-04-05 [PTadmin] Official Update 2010-01
// 
// 
// 1 16 0 0 0 1 0 0 0 1 0 0 0 1 4-4edge.dat
  [1,16,0,0,0,1,0,0,0,1,0,0,0,1, ldraw_lib__4_4edge()],
// 1 16 0 1 0 1 0 0 0 1 0 0 0 1 4-4edge.dat
  [1,16,0,1,0,1,0,0,0,1,0,0,0,1, ldraw_lib__4_4edge()],
// 1 16 0 0 0 1 0 0 0 1 0 0 0 1 4-4cyli.dat
  [1,16,0,0,0,1,0,0,0,1,0,0,0,1, ldraw_lib__4_4cyli()],
// 0
];
module ldraw_lib__4_4cylo(step=0, col=false, unit=2/5, alt=false, line=0.2, solid=!$preview)
    makepoly(ldraw_lib__4_4cylo(), step=step, col=col, unit=unit, alt=alt, line=line, solid=solid);
ldraw_lib__4_4cylo(line=0.2);
// file: 6141.scad
use <../lib.scad>
use <../p/4-4cylo.scad>
use <../p/4-4disc.scad>
use <../p/4-4ring3.scad>
use <../p/4-4ring4.scad>
use <../p/stud.scad>
use <../p/stud4.scad>
function ldraw_lib__6141() = [
// 0 Plate  1 x  1 Round
// 0 Name: 6141.dat
// 0 Author: James Jessiman
// 0 !LDRAW_ORG Part UPDATE 2015-01
// 0 !LICENSE Licensed under CC BY 2.0 and CC BY 4.0 : see CAreadme.txt
// 
// 0 BFC CERTIFY CCW
  [0,"BFC","CERTIFY"],
  [0,"BFC","CCW"],
// 
// 0 !HISTORY 1998-06-20 [PTadmin] Official Update 1998-06
// 0 !HISTORY 2003-01-29 [sbliss] Completed header; BFC'ed; misc cleanup
// 0 !HISTORY 2003-08-01 [PTadmin] Official Update 2003-02
// 0 !HISTORY 2007-10-26 [PTadmin] Header formatted for Contributor Agreement
// 0 !HISTORY 2008-07-01 [PTadmin] Official Update 2008-01
// 0 !HISTORY 2014-11-29 [Steffen] Renamed from 4073
// 0 !HISTORY 2014-12-28 [MagFors] Primitive substitution
// 0 !HISTORY 2015-10-11 [PTadmin] Official Update 2015-01
// 
// 
// 1 16 0 3 0 -1 0 0 0 -1.25 0 0 0 1 stud4.dat
  [1,16,0,3,0,-1,0,0,0,-1.25,0,0,0,1, ldraw_lib__stud4()],
// 1 16 0 3 0 -6 0 0 0 -1 0 0 0 6 4-4disc.dat
  [1,16,0,3,0,-6,0,0,0,-1,0,0,0,6, ldraw_lib__4_4disc()],
// 1 16 0 3 0 -2 0 0 0 -1 0 0 0 2 4-4ring4.dat
  [1,16,0,3,0,-2,0,0,0,-1,0,0,0,2, ldraw_lib__4_4ring4()],
// 1 16 0 0 0 10 0 0 0 3 0 0 0 10 4-4cylo.dat
  [1,16,0,0,0,10,0,0,0,3,0,0,0,10, ldraw_lib__4_4cylo()],
// 1 16 0 0 0 2 0 0 0 1 0 0 0 2 4-4ring4.dat
  [1,16,0,0,0,2,0,0,0,1,0,0,0,2, ldraw_lib__4_4ring4()],
// 1 16 0 0 0 2 0 0 0 1 0 0 0 2 4-4ring3.dat
  [1,16,0,0,0,2,0,0,0,1,0,0,0,2, ldraw_lib__4_4ring3()],
// 1 16 0 0 0 1 0 0 0 1 0 0 0 1 stud.dat
  [1,16,0,0,0,1,0,0,0,1,0,0,0,1, ldraw_lib__stud()],
];
module ldraw_lib__6141(step=0, col=false, unit=2/5, alt=false, line=0.2, solid=!$preview)
    makepoly(ldraw_lib__6141(), step=step, col=col, unit=unit, alt=alt, line=line, solid=solid);
ldraw_lib__6141(line=0.2);
// file: 4073.scad
use <../lib.scad>
use <6141.scad>
function ldraw_lib__4073() = [
// 0 ~Moved to 6141
// 0 Name: 4073.dat
// 0 Author: [PTadmin]
// 0 !LDRAW_ORG Part Alias UPDATE 2015-01
// 0 !LICENSE Licensed under CC BY 4.0 : see CAreadme.txt
// 
// 0 BFC CERTIFY CCW
  [0,"BFC","CERTIFY"],
  [0,"BFC","CCW"],
// 
// 0 !HISTORY 2015-10-11 [PTadmin] Official Update 2015-01
// 
// 
// 0 // Plate 1 x 1 Round
// 
// 1 16 0 0 0 1 0 0 0 1 0 0 0 1 6141.dat
  [1,16,0,0,0,1,0,0,0,1,0,0,0,1, ldraw_lib__6141()],
];
module ldraw_lib__4073(step=0, col=false, unit=2/5, alt=false, line=0.2, solid=!$preview)
    makepoly(ldraw_lib__4073(), step=step, col=col, unit=unit, alt=alt, line=line, solid=solid);
ldraw_lib__4073(line=0.2);
// main file
use <../lib.scad>
use <4073.scad>
function ldraw_lib__179() = [
// 0 ~Moved to 4073
// 0 Name: 179.dat
// 0 Author: [PTadmin]
// 0 !LDRAW_ORG Part UPDATE 1998-06
// 0 !LICENSE Licensed under CC BY 4.0 : see CAreadme.txt
// 
// 0 BFC CERTIFY CCW
  [0,"BFC","CERTIFY"],
  [0,"BFC","CCW"],
// 
// 0 !HISTORY 1998-06-20 [PTadmin] Official Update 1998-06
// 0 !HISTORY 2007-05-10 [PTadmin] Header formatted for Contributor Agreement
// 0 !HISTORY 2008-07-01 [PTadmin] Official Update 2008-01
// 
// 
// 1 16 0 0 0 1 0 0 0 1 0 0 0 1 4073.dat
  [1,16,0,0,0,1,0,0,0,1,0,0,0,1, ldraw_lib__4073()],
];
module ldraw_lib__179(step=0, col=false, unit=2/5, alt=false, line=0.2, solid=!$preview)
    makepoly(ldraw_lib__179(), step=step, col=col, unit=unit, alt=alt, line=line, solid=solid);
ldraw_lib__179(line=0.2);
